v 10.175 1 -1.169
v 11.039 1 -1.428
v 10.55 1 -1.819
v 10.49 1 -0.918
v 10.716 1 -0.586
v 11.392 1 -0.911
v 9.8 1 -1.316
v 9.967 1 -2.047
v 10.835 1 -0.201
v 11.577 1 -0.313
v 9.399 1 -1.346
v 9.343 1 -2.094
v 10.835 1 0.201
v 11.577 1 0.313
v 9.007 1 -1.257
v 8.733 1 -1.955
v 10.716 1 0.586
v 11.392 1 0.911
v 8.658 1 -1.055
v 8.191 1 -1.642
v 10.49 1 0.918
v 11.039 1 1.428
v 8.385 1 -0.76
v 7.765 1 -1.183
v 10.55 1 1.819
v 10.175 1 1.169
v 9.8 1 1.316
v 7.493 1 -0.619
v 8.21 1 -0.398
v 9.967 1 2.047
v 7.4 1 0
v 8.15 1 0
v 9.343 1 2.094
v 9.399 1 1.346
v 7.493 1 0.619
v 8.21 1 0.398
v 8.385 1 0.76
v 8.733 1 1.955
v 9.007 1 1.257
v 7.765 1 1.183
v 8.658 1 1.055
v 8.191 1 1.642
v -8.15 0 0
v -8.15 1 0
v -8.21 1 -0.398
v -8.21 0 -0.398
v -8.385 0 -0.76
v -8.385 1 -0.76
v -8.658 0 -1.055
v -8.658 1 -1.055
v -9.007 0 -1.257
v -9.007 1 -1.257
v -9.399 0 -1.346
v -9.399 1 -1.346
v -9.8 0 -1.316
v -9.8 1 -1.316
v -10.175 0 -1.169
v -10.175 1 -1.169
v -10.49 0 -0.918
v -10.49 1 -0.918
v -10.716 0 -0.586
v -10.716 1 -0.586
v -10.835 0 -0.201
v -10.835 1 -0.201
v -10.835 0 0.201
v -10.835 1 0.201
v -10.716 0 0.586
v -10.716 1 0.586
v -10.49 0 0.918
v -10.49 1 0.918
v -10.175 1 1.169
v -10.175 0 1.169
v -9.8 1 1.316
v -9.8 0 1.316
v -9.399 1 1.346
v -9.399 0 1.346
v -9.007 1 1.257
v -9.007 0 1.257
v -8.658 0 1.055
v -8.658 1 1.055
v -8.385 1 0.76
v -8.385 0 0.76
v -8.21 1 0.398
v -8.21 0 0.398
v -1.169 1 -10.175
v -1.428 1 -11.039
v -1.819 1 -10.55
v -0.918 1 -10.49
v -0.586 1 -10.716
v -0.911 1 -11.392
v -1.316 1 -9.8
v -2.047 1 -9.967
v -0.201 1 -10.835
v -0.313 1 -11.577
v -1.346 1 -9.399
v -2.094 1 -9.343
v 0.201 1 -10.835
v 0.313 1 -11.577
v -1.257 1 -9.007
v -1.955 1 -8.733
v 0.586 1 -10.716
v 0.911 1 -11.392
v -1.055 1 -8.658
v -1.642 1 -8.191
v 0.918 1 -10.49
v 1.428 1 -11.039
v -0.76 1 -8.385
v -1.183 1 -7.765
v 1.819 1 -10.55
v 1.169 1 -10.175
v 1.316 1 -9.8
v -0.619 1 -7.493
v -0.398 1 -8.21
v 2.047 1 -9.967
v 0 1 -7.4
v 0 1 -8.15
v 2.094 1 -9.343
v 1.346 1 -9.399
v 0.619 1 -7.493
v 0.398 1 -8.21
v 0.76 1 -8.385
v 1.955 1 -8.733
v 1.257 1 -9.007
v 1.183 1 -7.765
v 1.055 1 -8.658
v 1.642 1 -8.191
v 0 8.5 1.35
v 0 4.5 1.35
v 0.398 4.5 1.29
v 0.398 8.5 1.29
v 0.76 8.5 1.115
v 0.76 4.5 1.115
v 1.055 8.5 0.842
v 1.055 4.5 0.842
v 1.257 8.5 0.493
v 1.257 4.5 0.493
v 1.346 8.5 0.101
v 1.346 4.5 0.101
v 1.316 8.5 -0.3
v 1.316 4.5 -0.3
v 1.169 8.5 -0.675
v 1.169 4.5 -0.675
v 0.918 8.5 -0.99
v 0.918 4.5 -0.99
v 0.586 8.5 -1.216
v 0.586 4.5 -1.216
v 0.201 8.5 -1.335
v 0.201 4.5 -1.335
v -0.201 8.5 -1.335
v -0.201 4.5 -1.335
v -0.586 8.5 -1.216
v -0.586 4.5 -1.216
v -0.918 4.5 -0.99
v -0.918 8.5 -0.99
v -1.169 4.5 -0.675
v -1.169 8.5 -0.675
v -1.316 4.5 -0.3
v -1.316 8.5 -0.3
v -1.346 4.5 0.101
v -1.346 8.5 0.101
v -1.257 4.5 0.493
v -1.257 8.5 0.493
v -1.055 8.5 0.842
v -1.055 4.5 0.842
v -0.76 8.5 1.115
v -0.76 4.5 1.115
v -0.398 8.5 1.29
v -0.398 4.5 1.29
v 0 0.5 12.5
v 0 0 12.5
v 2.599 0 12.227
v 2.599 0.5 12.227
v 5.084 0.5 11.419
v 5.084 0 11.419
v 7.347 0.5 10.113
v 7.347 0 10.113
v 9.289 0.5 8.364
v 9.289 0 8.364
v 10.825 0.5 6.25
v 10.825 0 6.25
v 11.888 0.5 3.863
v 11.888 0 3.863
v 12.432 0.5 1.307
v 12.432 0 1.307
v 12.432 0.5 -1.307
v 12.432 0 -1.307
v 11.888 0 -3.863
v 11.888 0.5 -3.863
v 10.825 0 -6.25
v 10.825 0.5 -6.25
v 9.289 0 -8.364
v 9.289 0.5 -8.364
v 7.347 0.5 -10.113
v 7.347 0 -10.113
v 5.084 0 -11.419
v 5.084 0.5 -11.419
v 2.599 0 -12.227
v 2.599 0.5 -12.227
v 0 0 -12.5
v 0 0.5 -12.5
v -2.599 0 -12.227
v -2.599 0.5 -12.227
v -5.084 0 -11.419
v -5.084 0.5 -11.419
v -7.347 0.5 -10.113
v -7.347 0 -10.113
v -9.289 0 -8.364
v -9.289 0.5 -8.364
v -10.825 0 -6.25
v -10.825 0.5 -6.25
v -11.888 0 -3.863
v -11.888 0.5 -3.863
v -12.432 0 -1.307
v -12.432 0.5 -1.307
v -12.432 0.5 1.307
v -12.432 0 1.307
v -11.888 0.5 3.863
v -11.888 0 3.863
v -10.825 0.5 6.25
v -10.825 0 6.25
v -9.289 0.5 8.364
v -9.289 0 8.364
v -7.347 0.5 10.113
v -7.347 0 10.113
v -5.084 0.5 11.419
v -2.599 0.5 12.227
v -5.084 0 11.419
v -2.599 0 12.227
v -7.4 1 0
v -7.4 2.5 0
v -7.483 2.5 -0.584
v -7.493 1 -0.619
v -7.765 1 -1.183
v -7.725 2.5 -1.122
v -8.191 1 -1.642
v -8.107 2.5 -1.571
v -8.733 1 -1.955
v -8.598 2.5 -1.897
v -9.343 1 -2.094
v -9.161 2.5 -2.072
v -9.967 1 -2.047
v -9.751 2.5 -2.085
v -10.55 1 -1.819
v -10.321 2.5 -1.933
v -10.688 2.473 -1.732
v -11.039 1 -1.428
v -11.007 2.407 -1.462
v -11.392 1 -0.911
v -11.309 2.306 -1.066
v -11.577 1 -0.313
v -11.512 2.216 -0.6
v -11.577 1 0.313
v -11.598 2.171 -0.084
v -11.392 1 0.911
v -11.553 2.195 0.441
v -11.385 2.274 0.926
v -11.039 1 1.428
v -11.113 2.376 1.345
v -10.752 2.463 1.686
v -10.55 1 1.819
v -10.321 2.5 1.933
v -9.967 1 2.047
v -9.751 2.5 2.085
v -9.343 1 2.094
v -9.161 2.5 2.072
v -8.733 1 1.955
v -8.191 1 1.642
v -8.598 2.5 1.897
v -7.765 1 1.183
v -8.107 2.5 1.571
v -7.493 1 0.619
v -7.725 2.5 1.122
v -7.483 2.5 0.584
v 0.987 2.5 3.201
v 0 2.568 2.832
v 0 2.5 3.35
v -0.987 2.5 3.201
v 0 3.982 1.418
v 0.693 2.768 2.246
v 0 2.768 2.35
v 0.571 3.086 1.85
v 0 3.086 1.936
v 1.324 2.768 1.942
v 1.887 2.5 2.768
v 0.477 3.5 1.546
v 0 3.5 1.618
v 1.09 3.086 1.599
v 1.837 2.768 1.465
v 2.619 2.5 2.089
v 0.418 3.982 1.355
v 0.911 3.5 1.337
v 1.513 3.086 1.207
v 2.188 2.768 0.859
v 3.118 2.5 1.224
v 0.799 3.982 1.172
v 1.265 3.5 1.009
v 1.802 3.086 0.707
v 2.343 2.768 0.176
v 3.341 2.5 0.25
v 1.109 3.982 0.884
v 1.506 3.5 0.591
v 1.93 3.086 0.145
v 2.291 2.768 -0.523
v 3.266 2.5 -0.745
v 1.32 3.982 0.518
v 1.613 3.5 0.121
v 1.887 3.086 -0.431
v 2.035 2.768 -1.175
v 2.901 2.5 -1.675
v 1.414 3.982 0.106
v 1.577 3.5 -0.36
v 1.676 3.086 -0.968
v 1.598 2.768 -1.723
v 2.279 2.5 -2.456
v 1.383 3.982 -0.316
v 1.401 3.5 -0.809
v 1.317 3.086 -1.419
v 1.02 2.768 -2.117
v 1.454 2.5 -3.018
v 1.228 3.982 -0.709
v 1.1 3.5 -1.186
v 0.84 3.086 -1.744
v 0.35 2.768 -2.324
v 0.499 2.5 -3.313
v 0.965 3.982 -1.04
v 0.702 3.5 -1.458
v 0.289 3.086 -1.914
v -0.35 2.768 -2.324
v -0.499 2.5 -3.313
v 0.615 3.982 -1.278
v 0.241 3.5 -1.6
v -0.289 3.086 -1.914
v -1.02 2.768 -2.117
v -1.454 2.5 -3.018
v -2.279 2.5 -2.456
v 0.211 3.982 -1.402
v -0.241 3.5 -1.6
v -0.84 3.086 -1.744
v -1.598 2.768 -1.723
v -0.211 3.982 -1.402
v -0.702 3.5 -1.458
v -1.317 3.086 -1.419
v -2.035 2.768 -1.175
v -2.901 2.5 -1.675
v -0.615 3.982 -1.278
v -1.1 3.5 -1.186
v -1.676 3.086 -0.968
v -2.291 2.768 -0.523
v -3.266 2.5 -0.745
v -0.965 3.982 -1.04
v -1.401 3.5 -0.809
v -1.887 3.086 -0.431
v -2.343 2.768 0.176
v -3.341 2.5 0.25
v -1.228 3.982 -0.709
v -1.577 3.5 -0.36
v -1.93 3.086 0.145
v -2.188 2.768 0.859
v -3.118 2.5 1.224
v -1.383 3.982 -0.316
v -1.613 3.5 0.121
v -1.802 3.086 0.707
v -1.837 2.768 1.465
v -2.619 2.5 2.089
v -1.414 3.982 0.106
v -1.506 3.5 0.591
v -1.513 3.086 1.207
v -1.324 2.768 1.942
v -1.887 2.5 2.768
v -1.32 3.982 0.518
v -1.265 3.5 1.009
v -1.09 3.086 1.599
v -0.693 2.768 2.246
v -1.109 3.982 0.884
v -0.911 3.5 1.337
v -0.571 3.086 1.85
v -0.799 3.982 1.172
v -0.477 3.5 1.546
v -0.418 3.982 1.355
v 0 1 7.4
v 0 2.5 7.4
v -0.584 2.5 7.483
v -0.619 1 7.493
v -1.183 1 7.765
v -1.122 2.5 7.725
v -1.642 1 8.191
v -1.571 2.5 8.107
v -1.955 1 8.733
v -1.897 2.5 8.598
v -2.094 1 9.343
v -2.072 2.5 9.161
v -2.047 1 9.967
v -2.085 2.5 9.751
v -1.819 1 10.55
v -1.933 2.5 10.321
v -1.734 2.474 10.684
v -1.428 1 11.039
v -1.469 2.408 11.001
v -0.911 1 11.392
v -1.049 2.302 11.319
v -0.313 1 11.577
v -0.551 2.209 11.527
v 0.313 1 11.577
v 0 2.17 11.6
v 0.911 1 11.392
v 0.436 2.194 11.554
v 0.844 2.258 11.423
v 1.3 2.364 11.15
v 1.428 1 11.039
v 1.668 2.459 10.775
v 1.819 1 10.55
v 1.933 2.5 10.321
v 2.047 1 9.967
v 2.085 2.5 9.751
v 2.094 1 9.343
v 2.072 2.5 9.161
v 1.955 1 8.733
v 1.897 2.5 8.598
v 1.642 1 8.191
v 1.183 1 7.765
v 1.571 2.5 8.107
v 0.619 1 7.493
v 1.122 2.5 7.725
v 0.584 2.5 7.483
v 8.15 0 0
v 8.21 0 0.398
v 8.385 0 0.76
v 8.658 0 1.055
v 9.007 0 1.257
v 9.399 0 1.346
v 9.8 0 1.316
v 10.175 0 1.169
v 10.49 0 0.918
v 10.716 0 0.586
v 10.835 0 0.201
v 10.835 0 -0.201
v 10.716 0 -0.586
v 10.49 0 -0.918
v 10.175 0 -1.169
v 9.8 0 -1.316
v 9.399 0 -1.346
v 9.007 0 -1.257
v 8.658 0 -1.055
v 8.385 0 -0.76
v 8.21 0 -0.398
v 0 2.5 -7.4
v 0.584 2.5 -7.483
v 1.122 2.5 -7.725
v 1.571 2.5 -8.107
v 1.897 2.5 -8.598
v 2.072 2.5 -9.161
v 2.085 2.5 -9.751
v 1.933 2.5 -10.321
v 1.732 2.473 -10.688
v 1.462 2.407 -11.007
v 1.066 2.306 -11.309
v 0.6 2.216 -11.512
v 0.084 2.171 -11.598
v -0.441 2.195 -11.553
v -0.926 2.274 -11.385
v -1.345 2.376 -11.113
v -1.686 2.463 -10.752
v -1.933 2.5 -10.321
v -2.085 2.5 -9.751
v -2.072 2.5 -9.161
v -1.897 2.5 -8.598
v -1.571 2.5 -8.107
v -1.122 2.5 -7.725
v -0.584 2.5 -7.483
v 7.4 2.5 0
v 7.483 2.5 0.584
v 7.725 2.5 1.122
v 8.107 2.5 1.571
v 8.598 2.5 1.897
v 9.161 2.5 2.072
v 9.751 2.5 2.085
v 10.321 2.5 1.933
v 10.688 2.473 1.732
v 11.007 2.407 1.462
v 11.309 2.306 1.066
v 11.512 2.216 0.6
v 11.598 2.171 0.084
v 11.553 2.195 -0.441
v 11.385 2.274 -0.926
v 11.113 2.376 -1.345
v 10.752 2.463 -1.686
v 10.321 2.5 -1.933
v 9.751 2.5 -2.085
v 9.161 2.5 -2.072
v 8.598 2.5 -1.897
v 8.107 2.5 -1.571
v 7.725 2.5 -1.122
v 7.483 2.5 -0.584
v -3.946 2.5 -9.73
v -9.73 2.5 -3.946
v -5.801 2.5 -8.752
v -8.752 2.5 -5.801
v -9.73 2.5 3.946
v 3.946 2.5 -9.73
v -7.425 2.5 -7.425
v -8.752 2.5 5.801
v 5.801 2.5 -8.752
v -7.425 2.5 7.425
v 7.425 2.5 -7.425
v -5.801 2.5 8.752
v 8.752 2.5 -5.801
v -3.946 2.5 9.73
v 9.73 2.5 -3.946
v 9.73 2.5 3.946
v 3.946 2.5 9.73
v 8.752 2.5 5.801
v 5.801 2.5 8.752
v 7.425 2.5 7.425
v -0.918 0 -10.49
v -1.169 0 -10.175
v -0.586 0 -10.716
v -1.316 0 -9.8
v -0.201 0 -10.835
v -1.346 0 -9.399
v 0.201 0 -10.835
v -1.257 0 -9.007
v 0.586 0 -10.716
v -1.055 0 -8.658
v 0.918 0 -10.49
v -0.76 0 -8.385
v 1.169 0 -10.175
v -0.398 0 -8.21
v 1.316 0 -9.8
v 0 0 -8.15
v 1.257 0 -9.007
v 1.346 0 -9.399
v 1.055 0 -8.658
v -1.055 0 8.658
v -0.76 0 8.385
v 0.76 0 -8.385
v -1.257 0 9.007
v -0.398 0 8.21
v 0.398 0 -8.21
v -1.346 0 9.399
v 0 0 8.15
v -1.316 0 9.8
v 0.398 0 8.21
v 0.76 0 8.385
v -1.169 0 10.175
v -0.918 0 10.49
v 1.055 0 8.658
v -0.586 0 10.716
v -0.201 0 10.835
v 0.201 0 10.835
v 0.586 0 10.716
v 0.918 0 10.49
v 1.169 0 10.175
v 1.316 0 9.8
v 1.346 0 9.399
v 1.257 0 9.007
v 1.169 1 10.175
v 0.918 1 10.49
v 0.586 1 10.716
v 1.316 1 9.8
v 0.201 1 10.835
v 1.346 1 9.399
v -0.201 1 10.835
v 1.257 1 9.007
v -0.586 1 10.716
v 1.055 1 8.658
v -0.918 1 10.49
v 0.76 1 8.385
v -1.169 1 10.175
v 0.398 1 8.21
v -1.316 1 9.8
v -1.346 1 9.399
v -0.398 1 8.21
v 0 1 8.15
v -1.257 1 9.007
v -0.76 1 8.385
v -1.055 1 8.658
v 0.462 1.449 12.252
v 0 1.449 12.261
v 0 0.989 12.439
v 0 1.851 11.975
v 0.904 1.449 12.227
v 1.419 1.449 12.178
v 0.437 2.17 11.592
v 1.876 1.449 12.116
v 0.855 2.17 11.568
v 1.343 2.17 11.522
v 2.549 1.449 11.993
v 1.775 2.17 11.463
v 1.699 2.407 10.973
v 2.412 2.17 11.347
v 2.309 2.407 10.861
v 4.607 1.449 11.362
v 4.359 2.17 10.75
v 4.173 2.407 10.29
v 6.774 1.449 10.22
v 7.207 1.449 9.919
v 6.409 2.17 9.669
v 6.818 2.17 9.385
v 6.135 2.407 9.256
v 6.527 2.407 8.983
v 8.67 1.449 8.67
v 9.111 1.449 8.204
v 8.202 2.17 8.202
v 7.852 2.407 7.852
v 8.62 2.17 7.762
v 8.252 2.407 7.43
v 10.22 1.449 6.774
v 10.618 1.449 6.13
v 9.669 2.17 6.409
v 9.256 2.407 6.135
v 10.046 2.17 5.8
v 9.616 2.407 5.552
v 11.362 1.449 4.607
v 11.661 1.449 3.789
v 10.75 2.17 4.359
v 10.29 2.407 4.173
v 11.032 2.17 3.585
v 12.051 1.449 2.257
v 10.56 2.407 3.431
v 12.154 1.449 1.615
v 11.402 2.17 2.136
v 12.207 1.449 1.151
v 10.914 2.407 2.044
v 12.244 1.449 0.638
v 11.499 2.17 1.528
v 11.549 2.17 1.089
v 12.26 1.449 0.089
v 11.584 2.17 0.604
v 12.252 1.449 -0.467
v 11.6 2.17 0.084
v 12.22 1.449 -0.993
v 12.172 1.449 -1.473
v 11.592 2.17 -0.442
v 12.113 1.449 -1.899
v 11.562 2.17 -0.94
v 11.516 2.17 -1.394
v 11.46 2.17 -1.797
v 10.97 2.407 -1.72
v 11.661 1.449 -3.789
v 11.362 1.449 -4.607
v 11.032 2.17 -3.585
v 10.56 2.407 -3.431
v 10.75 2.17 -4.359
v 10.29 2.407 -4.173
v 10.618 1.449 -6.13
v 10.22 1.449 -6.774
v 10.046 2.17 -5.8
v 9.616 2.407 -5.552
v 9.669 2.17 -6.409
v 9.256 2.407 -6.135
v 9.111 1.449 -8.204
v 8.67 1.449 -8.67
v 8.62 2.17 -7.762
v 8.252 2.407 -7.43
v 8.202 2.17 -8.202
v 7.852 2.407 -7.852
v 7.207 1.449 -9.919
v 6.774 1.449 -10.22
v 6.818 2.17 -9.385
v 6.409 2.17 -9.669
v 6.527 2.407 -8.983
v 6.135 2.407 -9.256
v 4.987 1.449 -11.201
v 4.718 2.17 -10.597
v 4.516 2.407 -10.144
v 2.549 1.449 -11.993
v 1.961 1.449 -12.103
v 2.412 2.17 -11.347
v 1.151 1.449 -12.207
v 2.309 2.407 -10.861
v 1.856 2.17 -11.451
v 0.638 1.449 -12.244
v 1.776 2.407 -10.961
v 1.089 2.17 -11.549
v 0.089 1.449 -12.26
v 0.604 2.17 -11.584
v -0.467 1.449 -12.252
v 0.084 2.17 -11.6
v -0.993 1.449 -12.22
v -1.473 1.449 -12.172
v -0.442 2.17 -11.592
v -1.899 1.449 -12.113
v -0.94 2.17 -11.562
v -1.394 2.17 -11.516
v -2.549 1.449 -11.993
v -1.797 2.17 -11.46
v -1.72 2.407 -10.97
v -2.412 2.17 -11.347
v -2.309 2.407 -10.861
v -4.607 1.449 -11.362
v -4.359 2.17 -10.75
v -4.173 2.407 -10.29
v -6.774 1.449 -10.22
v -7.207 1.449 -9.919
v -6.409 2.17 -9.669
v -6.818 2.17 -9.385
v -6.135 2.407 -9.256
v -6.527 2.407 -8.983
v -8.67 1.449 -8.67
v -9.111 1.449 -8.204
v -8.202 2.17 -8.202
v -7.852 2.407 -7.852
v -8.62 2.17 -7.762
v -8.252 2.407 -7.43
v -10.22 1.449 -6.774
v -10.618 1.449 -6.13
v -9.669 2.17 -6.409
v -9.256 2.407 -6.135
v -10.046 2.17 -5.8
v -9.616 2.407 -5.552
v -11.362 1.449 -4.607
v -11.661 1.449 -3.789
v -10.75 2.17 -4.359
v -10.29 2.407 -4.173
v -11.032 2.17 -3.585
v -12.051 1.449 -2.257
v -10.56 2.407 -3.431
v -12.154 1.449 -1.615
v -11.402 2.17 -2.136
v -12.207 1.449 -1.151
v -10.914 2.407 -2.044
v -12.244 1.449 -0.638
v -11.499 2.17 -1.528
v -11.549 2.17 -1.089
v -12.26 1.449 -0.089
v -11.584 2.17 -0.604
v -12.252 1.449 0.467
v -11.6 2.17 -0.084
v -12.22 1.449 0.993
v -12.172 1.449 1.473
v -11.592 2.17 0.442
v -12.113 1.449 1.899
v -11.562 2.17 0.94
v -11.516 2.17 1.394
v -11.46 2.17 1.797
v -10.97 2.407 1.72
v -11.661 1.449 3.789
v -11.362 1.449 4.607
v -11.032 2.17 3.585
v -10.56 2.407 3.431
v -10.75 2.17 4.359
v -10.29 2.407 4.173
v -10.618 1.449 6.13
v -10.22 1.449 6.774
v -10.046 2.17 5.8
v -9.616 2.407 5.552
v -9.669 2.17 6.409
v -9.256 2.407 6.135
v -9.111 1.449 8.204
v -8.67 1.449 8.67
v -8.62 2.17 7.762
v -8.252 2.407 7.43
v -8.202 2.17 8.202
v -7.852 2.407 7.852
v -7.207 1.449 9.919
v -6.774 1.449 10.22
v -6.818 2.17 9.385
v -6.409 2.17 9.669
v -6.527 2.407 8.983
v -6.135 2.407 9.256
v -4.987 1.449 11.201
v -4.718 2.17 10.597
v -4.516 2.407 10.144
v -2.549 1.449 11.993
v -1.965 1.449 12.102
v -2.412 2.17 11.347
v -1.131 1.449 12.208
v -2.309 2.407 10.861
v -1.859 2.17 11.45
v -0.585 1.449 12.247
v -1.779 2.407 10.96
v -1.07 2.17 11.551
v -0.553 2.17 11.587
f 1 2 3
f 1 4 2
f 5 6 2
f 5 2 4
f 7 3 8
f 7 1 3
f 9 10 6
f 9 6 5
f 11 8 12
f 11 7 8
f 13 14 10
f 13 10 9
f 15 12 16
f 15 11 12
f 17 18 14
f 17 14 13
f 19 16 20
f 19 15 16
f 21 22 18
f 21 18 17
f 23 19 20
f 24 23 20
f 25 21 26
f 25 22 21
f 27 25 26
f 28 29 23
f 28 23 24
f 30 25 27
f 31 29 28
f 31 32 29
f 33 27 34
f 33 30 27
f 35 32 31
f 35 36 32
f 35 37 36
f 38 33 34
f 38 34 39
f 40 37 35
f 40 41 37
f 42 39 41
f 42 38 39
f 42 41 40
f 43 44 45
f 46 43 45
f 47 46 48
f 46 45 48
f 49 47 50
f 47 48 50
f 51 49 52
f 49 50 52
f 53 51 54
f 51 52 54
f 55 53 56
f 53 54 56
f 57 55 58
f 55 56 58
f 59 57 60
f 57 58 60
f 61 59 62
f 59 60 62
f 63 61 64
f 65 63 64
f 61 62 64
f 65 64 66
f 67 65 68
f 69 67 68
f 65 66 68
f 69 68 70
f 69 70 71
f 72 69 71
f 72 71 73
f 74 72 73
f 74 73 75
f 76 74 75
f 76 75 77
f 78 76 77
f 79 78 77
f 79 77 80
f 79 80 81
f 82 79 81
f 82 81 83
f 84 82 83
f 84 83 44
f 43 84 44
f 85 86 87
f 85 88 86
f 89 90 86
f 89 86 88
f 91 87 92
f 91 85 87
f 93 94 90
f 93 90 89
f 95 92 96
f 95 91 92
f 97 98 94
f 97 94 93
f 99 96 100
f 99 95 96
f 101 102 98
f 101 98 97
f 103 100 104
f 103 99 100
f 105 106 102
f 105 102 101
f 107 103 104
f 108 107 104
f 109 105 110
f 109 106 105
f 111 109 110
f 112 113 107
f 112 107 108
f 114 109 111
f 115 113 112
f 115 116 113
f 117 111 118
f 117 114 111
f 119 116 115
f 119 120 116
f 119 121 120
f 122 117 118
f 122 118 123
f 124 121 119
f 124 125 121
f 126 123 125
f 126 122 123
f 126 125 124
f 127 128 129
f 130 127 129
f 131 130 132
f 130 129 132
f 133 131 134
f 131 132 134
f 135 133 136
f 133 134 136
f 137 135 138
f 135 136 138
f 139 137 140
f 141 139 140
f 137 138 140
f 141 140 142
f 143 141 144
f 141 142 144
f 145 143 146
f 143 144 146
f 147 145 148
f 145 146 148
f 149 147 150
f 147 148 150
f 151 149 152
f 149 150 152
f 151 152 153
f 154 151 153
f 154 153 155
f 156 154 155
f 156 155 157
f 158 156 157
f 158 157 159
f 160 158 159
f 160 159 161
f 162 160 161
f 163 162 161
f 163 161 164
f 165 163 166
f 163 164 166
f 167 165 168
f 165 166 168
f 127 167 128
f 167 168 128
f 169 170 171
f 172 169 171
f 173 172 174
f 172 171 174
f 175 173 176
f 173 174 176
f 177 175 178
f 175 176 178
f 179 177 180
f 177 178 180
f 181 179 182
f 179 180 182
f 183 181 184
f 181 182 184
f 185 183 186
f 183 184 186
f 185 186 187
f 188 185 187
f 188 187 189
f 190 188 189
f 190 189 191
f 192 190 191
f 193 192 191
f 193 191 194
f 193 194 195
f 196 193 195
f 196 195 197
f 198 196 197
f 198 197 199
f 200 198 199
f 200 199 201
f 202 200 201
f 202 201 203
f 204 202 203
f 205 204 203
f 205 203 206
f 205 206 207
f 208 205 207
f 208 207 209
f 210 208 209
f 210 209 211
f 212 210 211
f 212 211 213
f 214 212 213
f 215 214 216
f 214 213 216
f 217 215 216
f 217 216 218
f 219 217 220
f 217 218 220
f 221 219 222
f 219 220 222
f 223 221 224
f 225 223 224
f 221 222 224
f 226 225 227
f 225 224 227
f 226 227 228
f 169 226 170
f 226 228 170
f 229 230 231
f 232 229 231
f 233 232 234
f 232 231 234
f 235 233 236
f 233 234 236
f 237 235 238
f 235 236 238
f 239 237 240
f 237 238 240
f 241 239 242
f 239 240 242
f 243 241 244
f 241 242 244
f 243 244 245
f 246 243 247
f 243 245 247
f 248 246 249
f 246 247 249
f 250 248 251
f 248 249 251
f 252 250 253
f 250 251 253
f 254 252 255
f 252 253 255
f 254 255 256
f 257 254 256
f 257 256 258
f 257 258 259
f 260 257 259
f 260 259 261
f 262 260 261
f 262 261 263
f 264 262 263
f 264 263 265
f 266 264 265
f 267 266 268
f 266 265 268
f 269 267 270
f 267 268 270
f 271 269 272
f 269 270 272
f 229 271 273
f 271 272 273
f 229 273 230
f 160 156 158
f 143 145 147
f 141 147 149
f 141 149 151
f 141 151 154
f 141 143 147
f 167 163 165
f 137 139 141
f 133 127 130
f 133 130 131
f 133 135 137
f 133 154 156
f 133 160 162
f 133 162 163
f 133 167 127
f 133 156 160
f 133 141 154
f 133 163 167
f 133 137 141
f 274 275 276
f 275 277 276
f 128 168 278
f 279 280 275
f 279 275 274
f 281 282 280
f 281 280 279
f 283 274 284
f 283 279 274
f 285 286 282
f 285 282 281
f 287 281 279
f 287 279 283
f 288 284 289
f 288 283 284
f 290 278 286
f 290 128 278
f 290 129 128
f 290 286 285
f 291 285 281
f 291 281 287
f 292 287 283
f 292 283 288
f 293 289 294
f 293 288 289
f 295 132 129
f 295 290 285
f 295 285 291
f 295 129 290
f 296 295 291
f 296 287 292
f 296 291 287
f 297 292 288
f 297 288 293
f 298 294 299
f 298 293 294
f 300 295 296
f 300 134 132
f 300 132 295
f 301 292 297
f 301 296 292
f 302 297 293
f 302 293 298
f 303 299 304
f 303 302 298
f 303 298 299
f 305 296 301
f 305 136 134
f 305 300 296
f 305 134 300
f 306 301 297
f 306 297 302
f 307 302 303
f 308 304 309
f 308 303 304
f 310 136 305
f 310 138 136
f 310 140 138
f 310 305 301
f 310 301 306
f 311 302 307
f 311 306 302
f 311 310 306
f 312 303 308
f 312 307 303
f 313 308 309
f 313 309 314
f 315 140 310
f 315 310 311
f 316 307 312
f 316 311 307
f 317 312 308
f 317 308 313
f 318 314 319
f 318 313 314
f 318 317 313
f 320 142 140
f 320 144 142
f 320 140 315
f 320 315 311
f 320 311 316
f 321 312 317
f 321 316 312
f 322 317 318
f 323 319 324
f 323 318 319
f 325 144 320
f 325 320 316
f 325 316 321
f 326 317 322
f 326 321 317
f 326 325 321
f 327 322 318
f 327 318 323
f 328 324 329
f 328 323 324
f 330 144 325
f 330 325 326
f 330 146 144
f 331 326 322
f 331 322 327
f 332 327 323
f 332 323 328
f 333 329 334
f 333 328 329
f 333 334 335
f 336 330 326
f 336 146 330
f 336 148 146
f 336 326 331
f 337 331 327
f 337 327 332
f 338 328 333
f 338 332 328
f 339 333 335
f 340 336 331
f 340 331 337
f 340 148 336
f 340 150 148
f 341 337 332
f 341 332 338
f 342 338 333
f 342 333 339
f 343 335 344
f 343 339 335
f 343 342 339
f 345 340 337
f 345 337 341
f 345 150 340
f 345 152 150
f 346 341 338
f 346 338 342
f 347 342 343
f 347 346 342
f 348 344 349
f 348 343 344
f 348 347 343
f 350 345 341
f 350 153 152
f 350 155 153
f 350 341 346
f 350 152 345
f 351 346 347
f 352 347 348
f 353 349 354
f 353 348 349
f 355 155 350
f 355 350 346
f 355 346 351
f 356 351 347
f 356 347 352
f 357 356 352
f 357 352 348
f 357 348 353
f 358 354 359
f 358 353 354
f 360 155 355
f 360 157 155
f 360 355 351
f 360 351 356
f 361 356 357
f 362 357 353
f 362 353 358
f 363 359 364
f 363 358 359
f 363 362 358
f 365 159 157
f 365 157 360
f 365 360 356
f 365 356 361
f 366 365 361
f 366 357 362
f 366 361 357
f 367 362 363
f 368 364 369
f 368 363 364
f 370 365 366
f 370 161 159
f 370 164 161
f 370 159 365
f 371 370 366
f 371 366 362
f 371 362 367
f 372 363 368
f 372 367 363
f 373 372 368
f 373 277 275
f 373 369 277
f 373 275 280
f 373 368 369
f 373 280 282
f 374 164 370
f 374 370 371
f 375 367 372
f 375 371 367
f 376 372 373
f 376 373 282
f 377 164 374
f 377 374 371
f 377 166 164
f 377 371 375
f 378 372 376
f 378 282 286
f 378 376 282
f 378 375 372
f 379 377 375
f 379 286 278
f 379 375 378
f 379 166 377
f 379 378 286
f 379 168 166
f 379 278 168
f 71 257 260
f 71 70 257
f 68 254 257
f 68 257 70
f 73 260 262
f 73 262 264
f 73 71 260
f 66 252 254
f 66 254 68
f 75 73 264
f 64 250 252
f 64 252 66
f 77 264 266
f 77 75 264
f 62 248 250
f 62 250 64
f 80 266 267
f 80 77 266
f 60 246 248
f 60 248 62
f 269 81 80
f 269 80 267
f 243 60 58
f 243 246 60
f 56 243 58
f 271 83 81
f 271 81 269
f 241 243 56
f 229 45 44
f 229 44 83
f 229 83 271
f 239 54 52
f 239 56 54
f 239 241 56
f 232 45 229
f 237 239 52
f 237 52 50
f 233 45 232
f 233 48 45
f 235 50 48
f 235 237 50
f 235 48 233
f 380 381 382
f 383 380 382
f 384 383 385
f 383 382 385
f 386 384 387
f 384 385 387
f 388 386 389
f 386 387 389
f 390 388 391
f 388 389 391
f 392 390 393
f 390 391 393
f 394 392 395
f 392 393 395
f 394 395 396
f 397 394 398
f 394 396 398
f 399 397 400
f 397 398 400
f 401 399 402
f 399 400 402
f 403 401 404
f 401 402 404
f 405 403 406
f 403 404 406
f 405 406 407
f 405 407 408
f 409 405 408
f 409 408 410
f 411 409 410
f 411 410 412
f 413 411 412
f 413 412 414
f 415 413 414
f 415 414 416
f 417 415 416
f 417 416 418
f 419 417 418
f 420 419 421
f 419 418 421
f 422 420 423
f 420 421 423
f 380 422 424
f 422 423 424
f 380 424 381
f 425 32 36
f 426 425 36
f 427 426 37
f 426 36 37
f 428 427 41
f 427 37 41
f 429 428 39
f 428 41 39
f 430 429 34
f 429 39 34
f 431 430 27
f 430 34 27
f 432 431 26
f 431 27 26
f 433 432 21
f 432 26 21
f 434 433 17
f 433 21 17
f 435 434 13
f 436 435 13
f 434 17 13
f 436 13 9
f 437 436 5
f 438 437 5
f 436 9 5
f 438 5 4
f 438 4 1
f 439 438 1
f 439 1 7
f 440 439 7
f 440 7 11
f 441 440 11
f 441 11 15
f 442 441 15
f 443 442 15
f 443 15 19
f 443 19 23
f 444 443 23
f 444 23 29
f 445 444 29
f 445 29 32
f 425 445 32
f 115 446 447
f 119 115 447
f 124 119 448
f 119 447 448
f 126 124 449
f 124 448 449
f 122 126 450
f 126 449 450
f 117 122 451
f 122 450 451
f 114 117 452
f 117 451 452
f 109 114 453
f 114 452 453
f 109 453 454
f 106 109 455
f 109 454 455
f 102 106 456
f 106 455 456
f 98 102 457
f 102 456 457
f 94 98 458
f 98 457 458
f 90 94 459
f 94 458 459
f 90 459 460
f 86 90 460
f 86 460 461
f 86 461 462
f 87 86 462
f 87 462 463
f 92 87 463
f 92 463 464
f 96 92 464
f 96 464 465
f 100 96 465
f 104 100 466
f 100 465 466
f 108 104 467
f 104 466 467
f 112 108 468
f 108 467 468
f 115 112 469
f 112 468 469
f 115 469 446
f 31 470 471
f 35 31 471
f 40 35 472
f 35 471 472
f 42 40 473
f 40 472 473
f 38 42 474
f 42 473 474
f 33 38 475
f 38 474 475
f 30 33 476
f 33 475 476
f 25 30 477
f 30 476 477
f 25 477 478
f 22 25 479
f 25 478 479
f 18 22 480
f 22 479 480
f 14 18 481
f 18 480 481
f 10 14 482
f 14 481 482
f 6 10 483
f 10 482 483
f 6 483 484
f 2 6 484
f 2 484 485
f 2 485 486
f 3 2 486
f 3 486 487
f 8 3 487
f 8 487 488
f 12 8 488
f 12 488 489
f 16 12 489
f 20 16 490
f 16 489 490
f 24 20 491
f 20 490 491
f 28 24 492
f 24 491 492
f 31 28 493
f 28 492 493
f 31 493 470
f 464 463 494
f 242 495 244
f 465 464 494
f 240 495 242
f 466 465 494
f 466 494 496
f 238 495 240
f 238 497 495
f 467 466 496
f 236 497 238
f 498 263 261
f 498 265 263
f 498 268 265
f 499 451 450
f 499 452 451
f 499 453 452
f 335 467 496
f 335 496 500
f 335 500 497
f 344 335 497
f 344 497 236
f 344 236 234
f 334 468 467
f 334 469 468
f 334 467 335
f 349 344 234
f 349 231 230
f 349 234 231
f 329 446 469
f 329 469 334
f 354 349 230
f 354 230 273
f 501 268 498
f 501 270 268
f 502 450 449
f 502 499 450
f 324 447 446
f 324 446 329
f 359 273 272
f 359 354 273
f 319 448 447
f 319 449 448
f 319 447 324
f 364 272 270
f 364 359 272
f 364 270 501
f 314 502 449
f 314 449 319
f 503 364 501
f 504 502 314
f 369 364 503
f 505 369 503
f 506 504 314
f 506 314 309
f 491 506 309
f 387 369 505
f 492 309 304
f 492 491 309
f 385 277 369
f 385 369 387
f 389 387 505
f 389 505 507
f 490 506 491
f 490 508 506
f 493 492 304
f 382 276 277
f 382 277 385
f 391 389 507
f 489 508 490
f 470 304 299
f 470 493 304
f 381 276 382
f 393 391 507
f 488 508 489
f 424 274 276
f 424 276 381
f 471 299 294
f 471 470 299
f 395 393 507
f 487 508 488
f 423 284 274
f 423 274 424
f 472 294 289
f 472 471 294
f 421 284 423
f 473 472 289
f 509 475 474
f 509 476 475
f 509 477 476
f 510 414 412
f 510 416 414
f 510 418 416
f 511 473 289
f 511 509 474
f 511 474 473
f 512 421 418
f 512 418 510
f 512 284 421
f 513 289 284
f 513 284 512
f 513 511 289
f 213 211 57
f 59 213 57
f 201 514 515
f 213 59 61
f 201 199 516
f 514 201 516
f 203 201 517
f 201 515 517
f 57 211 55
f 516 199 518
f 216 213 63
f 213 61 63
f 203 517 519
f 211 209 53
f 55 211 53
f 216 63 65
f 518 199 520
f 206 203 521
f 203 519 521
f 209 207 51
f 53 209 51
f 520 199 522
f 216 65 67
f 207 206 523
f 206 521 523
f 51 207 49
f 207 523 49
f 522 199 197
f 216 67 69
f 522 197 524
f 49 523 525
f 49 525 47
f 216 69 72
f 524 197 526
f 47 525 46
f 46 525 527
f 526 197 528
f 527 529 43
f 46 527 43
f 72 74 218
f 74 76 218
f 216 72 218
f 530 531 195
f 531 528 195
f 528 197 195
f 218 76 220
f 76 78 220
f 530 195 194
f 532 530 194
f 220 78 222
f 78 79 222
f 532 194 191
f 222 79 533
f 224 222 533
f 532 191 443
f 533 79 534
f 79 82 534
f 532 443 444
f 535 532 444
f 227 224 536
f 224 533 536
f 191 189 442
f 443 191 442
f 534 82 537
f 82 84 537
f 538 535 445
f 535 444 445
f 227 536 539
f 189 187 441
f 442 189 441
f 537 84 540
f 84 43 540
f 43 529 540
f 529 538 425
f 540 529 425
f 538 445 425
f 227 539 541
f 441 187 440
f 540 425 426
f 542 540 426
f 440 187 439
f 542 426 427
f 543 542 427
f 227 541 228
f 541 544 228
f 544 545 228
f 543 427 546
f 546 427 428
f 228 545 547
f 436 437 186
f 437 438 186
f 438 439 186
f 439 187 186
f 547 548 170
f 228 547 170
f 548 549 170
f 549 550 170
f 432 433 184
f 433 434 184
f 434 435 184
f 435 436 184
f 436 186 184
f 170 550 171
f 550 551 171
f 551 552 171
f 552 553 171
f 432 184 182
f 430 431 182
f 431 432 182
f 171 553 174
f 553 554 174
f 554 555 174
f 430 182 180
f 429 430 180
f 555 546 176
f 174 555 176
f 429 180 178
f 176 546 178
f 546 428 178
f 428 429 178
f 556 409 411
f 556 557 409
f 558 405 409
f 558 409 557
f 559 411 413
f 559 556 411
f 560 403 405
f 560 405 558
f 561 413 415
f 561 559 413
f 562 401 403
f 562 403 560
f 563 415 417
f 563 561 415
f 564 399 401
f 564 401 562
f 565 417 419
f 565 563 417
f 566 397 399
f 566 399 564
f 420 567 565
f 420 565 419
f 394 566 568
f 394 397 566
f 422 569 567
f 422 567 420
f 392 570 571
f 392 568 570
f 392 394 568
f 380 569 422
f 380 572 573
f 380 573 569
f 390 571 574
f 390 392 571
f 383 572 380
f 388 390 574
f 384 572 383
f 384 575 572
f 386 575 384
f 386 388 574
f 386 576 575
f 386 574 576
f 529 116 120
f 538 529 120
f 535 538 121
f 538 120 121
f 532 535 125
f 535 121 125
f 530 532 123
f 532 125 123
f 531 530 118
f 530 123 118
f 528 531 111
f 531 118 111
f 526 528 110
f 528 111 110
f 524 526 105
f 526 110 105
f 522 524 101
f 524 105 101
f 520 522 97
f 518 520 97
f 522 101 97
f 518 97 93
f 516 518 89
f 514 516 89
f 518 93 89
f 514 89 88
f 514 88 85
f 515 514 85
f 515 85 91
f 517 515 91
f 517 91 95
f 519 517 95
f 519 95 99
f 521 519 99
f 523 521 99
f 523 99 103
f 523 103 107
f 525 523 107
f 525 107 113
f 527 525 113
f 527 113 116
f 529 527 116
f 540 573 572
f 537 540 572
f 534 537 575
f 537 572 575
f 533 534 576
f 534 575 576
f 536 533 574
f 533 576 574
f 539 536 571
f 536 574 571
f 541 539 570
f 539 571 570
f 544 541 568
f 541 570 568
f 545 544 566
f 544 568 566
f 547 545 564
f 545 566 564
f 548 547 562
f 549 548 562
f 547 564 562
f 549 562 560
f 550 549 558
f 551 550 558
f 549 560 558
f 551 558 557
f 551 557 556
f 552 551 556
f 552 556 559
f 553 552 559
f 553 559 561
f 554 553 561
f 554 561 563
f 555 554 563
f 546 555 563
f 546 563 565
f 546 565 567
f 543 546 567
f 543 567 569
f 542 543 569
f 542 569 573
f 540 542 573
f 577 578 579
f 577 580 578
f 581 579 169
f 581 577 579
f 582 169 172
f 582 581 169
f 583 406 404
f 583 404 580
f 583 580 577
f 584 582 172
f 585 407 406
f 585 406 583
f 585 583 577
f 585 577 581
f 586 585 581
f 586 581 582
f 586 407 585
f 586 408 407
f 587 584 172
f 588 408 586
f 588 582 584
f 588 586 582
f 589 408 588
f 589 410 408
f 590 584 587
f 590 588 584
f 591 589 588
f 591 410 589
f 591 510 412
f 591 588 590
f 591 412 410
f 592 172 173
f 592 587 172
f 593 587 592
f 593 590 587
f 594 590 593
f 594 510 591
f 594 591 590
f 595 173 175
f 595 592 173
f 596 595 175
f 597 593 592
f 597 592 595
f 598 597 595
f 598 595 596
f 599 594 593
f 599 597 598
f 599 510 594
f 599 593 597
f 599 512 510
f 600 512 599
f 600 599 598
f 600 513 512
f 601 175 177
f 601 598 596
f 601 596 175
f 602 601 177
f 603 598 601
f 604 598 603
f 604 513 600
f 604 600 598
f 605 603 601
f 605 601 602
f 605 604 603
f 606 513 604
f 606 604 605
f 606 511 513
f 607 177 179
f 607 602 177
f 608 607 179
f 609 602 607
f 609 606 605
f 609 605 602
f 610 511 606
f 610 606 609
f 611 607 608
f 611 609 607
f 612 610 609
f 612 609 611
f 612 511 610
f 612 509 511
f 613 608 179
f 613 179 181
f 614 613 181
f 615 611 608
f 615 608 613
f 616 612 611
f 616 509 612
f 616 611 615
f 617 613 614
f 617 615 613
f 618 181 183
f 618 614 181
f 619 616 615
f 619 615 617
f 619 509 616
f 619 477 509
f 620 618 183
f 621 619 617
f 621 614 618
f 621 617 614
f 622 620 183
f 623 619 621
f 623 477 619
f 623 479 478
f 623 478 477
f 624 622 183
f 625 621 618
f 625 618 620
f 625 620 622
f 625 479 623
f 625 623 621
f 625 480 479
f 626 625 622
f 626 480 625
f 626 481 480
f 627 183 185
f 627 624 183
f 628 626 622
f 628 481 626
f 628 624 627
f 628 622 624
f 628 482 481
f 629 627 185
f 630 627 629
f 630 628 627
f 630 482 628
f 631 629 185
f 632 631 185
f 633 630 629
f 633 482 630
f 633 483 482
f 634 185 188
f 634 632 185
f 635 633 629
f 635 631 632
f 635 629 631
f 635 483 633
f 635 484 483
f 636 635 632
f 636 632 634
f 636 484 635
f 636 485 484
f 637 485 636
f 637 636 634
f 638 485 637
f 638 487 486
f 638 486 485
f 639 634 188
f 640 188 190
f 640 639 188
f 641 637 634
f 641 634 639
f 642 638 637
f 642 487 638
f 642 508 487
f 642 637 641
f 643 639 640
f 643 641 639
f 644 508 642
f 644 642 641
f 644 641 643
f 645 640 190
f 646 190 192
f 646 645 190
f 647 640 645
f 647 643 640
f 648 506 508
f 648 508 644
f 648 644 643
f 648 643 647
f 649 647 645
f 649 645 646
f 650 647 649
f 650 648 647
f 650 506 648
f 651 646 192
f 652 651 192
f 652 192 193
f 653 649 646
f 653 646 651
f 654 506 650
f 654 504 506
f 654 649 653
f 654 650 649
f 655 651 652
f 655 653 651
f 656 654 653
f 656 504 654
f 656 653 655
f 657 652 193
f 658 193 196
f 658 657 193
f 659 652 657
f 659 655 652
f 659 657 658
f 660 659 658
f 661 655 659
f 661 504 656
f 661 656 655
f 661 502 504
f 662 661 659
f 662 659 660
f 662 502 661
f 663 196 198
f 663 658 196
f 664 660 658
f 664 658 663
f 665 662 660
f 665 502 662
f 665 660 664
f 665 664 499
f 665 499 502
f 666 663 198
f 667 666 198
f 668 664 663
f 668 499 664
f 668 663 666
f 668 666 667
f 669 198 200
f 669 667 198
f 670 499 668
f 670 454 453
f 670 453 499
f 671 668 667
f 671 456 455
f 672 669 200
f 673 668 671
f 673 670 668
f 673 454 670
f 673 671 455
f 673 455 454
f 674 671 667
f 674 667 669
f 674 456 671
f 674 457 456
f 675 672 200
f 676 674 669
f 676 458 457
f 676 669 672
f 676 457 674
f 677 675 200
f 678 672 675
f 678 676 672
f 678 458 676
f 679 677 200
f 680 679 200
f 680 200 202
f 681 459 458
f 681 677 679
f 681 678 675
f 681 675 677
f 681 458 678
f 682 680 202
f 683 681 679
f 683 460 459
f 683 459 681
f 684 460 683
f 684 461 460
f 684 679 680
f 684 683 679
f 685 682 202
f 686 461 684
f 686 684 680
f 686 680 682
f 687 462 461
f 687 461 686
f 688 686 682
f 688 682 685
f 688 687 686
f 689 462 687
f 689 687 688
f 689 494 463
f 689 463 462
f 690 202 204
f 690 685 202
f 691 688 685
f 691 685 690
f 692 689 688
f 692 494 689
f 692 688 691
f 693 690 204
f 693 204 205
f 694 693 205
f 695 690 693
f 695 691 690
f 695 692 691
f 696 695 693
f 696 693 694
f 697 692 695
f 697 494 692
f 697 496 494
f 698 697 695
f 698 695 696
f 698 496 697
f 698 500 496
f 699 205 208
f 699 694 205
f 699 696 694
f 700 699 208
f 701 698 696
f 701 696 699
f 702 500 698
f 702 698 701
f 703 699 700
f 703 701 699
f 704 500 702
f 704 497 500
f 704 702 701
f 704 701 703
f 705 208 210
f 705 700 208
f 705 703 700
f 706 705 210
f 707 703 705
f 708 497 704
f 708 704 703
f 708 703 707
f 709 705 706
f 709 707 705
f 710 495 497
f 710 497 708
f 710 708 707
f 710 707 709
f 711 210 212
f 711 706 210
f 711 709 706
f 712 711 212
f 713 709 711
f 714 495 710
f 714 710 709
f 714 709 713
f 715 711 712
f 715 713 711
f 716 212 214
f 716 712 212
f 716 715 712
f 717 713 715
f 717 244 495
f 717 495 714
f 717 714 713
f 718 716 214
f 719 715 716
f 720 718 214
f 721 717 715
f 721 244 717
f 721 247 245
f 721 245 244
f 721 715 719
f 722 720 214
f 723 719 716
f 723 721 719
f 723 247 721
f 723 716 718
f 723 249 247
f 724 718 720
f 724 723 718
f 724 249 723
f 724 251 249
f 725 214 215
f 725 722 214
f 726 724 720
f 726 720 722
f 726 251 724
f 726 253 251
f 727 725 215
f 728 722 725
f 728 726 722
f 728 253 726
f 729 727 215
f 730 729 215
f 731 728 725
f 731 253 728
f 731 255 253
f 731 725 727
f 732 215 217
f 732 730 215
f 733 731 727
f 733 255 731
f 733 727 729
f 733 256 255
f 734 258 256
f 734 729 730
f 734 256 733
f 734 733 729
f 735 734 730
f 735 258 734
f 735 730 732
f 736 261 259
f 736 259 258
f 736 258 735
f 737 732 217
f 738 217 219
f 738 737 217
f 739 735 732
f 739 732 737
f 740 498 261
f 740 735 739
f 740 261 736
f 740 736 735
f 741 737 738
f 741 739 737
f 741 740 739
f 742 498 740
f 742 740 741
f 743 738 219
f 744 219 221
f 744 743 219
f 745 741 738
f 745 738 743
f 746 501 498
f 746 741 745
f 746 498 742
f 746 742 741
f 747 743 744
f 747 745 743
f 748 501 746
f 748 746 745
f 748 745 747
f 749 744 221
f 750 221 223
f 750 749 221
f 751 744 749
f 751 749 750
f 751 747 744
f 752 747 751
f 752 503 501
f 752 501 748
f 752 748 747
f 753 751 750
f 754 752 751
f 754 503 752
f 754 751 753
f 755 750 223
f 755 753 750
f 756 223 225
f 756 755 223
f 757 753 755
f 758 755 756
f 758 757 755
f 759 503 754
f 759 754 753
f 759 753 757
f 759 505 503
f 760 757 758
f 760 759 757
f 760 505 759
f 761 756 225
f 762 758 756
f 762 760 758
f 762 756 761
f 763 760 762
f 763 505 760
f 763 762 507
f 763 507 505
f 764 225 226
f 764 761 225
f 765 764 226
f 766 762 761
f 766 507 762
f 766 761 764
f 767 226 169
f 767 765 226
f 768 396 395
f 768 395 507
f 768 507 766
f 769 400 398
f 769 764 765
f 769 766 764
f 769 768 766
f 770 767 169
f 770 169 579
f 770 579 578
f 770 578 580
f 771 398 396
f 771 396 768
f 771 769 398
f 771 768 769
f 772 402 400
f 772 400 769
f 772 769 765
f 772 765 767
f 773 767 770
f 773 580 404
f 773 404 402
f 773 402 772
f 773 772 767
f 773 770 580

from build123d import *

# Parameters (mm, degrees)
SKETCH1_R           = 12.5
BOSS_EXTRUDE1_DEPTH = 2.5
SKETCH2_R           = 1.35
CUT_EXTRUDE1_DEPTH  = 18.853571071
SKETCH4_R           = 2.1
CUT_EXTRUDE2_DEPTH  = 1.5
CIRPATTERN1_COUNT   = 4
SKETCH3_R           = 1.35
BOSS_EXTRUDE2_DEPTH = 6
FILLET2_R           = 2
FILLET3_R           = 2


with BuildPart() as part:
    # Sketch1 → Boss-Extrude1 (new body)
    with BuildSketch(Plane(origin=(0, 0, 0), x_dir=(1, 0, 0), z_dir=(0, 1, 0))):
        with Locations(Location((0, 0, 0), (0, 0, 270))):
            Circle(SKETCH1_R)
    extrude(amount=BOSS_EXTRUDE1_DEPTH)

    # Sketch2 → Cut-Extrude1 (cut, through all)
    with BuildSketch(Plane(origin=(0, 2.5, 0), x_dir=(1, 0, 0), z_dir=(0, 1, 0))):
        with Locations(Location((0, 9.5, 0), (0, 0, 270))):
            Circle(SKETCH2_R)
    cut_extrude1 = extrude(amount=-CUT_EXTRUDE1_DEPTH, mode=Mode.SUBTRACT)

    # Sketch4 → Cut-Extrude2 (cut)
    with BuildSketch(Plane(origin=(0, 2.5, 0), x_dir=(1, 0, 0), z_dir=(0, 1, 0))):
        with Locations(Location((0, 9.5, 0), (0, 0, 270))):
            Circle(SKETCH4_R)
    cut_extrude2 = extrude(amount=-CUT_EXTRUDE2_DEPTH, mode=Mode.SUBTRACT)

    # CirPattern1: Cut-Extrude1, Cut-Extrude2 ×4 about axis
    cirpattern1_axis = Axis((0, 0, 0), (0, 1, 0))
    add([cut_extrude1.rotate(cirpattern1_axis, i * 360 / CIRPATTERN1_COUNT) for i in range(1, CIRPATTERN1_COUNT)], mode=Mode.SUBTRACT)
    add([cut_extrude2.rotate(cirpattern1_axis, i * 360 / CIRPATTERN1_COUNT) for i in range(1, CIRPATTERN1_COUNT)], mode=Mode.SUBTRACT)

    # Sketch3 → Boss-Extrude2 (add)
    with BuildSketch(Plane(origin=(0, 2.5, 0), x_dir=(1, 0, 0), z_dir=(0, 1, 0))):
        with Locations(Location((0, 0, 0), (0, 0, 270))):
            Circle(SKETCH3_R)
    extrude(amount=BOSS_EXTRUDE2_DEPTH)

    # Fillet2
    fillet2_edges = [part.edges().sort_by_distance(p)[0] for p in [
        (0, 2.5, -1.35),
    ]]
    fillet(fillet2_edges, radius=FILLET2_R)

    # Fillet3
    # the kernel refuses this fillet: 2 mm, written as the material it takes off along each edge
    with BuildSketch(Plane(origin=(0, 2.5, 0), x_dir=(0, 0, 1), z_dir=(-1, 0, 0))) as fillet3_piece_1:
        with BuildLine():
            CenterArc((12.5 - FILLET3_R, -FILLET3_R), FILLET3_R, 0, 90)
            Line((12.5, -FILLET3_R), (12.5, 0))
            Line((12.5, 0), (12.5 - FILLET3_R, 0))
        make_face()
    revolve(axis=Axis((0, 2.5, 0), (0, 1, 0)), mode=Mode.SUBTRACT)


solid = part.part
